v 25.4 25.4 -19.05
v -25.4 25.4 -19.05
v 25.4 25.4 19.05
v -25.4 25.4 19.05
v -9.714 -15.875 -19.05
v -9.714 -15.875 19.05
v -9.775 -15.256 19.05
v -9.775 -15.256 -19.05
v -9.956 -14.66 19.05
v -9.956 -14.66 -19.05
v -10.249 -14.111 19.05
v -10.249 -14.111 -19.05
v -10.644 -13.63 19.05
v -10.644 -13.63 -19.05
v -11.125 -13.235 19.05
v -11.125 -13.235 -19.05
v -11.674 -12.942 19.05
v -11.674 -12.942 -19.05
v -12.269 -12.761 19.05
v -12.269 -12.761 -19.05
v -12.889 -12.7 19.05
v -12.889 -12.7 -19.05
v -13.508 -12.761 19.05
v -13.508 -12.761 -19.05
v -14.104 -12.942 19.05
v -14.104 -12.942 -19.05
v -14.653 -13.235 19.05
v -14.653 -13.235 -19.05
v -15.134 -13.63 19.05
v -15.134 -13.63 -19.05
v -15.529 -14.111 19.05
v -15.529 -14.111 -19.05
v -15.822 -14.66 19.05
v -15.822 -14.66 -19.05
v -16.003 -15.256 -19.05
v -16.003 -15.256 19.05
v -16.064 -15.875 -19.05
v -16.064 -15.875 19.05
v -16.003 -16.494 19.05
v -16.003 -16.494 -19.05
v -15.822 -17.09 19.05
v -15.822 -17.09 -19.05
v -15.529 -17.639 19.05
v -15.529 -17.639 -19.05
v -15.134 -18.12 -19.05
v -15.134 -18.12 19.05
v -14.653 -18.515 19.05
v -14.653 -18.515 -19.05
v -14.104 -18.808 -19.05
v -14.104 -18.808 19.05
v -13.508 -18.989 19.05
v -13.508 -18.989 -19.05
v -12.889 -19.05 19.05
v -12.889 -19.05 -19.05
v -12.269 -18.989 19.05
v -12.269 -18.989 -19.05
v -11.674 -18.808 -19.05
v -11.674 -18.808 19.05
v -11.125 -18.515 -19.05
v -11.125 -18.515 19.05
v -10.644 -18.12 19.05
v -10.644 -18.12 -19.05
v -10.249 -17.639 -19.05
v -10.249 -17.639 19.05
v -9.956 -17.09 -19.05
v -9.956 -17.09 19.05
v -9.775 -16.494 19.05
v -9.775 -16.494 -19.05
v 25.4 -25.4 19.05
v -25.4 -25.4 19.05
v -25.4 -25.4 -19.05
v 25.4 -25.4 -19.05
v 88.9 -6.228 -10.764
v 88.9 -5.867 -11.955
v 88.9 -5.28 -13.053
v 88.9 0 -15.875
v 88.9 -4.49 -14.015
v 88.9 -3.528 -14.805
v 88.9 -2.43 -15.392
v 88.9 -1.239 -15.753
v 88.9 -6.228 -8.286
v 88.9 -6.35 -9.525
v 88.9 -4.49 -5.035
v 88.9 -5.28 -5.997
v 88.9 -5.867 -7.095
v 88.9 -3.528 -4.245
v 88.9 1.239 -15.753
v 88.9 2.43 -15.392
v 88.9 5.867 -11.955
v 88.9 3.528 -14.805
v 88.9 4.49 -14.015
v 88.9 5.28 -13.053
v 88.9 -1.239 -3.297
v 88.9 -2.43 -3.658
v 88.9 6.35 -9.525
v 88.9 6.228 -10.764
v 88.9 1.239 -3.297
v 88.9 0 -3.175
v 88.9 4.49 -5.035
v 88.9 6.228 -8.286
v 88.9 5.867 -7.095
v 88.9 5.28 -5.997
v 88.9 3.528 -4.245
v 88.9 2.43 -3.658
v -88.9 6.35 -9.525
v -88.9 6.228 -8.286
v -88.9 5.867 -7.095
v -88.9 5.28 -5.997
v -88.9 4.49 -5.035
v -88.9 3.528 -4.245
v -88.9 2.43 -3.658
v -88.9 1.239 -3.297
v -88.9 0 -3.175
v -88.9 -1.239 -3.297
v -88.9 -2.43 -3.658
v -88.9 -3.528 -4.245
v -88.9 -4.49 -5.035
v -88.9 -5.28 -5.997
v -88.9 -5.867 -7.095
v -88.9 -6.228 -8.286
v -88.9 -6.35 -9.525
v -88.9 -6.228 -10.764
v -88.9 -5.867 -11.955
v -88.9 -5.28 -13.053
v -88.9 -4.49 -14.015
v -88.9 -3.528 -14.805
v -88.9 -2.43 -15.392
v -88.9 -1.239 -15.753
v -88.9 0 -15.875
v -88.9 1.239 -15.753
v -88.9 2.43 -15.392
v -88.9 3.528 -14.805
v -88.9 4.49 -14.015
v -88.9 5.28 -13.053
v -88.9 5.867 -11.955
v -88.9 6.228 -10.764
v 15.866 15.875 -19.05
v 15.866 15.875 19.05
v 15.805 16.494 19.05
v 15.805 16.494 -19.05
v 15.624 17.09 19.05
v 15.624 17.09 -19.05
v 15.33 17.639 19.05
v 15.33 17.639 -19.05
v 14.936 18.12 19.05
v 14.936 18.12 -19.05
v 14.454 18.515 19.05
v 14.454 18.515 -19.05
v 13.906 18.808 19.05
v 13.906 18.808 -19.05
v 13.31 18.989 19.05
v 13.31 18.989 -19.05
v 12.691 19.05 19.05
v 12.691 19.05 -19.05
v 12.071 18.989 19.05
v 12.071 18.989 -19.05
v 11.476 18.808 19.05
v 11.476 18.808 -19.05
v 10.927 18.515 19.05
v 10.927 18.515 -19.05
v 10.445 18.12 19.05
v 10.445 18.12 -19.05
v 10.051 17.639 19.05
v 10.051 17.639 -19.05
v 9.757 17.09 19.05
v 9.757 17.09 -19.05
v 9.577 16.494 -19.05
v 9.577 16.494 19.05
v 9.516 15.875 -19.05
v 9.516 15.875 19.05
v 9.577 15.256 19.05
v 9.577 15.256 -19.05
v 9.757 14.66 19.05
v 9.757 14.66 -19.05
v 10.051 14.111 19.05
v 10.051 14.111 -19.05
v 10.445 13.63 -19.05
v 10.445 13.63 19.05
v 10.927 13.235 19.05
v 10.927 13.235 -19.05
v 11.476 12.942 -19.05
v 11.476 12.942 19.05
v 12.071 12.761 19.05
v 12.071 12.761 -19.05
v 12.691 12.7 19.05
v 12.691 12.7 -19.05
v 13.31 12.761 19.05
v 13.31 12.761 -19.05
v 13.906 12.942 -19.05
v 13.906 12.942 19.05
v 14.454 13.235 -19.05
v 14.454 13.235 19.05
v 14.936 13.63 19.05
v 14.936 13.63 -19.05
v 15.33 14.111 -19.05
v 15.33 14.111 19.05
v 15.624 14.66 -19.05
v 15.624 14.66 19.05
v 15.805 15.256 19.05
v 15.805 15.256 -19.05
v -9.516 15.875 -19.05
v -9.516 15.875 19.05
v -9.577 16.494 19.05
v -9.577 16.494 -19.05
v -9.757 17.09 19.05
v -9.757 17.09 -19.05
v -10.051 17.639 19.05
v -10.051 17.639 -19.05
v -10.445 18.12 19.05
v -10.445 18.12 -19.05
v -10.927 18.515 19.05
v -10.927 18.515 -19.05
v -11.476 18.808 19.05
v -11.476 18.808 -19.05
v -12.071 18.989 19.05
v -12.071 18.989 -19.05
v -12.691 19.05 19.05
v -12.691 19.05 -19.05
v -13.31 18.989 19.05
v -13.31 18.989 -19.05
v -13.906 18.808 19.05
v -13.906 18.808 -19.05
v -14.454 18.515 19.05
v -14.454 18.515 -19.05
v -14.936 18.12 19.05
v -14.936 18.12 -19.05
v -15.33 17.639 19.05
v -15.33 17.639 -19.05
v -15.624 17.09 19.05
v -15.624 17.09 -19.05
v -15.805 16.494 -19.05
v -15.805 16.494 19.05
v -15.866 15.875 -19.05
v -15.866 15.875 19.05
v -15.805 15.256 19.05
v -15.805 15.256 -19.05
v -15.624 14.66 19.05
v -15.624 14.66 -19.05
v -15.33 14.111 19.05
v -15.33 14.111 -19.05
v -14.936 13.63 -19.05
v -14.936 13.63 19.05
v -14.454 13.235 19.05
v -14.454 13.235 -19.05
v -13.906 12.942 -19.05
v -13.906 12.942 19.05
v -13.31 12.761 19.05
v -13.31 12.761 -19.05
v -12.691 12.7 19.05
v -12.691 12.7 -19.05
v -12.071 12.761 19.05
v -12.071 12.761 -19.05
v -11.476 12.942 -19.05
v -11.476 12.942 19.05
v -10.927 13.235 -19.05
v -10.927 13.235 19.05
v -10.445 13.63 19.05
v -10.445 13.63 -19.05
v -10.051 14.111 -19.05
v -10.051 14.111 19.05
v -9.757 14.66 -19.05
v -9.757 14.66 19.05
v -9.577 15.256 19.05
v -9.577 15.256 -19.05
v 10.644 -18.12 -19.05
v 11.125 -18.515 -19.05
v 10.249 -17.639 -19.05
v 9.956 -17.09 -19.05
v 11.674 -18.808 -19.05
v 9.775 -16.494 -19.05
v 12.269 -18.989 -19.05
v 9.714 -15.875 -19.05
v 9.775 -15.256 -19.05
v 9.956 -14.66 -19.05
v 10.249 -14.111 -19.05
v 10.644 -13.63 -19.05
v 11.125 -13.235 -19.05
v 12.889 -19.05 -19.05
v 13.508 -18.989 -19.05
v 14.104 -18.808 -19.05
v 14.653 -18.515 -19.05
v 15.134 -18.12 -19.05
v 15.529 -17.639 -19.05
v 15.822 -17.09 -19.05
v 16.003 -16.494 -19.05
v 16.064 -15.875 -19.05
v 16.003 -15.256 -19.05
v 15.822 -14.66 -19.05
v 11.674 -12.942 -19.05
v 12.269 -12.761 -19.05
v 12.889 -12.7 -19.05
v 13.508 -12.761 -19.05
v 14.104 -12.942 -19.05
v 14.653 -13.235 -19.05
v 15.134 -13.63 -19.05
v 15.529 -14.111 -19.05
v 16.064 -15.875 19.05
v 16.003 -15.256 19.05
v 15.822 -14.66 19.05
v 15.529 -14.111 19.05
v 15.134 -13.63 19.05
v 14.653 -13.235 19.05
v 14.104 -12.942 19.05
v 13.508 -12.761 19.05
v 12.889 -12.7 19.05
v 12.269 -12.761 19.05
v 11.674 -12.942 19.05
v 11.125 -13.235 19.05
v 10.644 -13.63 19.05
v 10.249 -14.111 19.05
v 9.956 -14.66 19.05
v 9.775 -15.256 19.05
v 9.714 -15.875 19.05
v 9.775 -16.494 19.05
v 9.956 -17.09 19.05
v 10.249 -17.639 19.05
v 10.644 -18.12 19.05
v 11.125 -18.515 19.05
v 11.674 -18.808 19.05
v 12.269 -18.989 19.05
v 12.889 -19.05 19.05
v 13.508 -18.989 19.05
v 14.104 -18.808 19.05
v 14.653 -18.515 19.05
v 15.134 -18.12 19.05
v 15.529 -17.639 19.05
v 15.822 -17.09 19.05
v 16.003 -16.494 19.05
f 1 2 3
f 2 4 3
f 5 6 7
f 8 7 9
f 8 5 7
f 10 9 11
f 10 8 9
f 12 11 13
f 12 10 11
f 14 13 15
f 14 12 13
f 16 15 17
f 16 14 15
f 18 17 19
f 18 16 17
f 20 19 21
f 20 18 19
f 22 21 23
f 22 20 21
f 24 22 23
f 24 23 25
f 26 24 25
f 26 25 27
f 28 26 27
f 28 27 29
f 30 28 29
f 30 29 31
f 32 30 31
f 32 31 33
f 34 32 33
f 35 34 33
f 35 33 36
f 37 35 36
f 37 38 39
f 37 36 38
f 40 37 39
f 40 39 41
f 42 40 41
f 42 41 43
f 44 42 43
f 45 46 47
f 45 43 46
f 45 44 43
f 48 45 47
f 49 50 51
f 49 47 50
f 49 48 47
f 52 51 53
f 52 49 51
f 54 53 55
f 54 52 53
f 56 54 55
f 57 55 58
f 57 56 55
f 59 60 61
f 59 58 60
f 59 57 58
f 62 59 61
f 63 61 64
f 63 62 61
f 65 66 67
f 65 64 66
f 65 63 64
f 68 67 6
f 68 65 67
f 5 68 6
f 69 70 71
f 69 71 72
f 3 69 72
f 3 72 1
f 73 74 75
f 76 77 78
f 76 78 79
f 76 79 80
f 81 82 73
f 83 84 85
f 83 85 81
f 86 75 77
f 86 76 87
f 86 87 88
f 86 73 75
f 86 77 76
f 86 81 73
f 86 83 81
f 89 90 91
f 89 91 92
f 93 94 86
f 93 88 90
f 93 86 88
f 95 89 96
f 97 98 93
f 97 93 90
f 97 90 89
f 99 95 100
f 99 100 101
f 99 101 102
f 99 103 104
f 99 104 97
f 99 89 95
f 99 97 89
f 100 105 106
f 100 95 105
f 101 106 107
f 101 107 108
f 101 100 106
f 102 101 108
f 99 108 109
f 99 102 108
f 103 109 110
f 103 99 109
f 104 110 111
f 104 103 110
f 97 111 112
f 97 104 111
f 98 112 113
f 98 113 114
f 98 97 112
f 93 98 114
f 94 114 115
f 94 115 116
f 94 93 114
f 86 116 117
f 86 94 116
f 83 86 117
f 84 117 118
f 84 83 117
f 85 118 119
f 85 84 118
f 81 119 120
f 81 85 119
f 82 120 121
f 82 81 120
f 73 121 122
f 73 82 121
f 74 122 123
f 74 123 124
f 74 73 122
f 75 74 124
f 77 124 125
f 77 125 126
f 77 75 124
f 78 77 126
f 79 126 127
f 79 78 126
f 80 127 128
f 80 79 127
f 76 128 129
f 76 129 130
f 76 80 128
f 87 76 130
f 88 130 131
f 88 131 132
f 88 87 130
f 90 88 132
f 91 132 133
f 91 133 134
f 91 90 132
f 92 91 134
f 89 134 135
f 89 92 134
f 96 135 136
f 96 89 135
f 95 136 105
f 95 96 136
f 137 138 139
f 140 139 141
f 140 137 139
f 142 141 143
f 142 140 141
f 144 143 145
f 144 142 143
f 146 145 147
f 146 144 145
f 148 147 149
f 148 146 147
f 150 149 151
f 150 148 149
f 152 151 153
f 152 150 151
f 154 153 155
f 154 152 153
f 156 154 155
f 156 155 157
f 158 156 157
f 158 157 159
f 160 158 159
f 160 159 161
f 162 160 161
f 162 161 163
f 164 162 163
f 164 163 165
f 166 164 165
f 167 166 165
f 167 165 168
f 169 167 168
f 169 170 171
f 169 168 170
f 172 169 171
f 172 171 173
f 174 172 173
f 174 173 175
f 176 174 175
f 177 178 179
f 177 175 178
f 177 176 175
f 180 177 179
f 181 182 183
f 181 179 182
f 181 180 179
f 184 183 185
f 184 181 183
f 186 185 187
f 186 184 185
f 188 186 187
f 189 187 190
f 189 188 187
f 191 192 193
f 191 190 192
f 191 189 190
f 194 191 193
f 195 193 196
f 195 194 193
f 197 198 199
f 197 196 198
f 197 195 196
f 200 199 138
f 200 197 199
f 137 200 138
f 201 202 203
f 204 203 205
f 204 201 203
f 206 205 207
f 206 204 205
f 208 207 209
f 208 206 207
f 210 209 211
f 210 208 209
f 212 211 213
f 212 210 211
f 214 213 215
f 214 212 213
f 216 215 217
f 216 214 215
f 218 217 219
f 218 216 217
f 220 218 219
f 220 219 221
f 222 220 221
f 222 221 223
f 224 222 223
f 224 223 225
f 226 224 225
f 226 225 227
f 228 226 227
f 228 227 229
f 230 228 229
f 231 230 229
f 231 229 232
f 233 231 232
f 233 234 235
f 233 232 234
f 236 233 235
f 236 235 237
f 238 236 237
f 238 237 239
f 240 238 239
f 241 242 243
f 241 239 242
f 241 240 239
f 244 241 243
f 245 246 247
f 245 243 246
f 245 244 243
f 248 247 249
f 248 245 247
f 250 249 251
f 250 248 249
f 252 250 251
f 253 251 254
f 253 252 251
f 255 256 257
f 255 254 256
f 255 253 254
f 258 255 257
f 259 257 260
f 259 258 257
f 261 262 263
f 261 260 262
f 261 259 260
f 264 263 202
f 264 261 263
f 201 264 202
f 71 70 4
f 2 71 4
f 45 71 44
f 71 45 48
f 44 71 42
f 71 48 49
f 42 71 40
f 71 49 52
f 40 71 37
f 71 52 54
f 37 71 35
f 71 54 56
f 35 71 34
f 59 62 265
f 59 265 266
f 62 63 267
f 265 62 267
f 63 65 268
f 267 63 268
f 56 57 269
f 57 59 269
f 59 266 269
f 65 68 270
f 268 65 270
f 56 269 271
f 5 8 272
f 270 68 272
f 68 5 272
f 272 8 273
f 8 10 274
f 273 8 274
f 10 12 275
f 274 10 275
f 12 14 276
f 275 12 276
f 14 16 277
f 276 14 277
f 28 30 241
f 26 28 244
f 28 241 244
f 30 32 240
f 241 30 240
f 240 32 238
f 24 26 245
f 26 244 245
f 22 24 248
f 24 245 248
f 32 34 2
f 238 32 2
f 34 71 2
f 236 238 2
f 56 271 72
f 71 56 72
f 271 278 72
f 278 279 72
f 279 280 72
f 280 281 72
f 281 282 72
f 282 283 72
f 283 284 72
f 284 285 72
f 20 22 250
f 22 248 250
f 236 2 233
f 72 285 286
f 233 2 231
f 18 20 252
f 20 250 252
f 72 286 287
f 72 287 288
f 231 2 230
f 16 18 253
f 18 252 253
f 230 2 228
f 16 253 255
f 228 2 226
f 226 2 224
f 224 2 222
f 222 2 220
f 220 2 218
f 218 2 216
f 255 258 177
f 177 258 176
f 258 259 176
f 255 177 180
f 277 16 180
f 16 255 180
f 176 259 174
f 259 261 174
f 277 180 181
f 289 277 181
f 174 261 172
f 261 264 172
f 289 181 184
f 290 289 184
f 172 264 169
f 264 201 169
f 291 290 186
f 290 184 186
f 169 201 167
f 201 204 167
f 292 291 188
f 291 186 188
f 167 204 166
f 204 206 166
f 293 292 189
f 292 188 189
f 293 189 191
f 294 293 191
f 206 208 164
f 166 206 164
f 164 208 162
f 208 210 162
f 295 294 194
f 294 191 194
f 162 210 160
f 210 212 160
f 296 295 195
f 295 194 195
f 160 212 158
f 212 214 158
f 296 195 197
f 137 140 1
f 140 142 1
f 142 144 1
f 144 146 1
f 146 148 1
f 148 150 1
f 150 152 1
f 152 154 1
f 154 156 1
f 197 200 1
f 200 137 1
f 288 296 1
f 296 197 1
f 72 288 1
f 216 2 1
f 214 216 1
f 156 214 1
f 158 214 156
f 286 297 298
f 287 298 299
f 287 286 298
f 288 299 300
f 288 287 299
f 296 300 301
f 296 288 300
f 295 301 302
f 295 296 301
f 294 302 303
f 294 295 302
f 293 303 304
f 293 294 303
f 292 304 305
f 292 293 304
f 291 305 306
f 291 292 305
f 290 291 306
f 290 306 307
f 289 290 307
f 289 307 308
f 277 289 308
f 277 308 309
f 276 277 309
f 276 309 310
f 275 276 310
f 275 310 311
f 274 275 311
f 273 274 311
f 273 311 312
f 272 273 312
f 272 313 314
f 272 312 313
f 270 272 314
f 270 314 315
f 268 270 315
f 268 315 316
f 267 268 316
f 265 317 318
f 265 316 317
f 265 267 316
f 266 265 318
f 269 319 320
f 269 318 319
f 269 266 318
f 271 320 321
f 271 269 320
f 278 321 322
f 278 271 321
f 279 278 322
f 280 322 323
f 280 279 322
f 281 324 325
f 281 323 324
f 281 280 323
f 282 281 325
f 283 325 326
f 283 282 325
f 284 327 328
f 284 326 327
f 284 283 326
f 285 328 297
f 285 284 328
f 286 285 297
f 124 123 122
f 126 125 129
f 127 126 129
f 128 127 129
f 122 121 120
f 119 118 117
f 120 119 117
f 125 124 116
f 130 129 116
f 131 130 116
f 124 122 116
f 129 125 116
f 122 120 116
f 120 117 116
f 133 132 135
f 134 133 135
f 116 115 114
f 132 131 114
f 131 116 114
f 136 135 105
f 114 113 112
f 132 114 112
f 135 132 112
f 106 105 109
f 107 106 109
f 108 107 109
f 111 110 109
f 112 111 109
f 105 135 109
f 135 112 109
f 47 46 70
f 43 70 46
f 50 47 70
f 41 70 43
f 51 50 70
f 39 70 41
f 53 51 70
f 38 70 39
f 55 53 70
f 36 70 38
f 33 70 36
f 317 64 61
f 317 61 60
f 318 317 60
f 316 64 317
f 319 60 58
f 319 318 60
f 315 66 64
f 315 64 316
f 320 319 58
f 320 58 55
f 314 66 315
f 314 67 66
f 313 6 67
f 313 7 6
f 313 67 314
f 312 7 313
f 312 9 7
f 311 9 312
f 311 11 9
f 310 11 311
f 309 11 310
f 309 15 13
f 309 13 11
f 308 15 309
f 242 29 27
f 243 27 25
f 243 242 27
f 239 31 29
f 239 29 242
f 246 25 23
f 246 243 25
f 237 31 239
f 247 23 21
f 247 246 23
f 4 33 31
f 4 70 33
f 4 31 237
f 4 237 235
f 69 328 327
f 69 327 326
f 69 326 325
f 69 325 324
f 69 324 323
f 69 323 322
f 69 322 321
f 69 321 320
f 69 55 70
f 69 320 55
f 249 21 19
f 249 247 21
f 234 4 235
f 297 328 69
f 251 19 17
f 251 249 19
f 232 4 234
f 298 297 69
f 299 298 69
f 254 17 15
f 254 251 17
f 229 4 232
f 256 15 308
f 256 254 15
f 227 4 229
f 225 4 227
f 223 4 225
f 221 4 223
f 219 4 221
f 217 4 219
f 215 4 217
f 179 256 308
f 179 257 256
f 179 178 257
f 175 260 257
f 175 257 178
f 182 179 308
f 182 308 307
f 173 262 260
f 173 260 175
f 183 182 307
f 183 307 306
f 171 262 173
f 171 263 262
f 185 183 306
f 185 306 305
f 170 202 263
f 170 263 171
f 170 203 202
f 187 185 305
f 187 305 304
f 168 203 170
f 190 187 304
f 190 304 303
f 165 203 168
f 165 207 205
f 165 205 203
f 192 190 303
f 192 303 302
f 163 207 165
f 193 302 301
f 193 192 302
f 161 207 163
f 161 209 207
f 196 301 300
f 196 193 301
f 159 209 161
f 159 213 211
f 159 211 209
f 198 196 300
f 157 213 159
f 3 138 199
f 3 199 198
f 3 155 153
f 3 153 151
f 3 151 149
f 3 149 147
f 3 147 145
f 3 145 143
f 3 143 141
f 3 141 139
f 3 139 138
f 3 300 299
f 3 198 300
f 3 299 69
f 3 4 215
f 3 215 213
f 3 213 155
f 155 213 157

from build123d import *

# Parameters (mm, degrees)
F0_W     = 50.8
F0_H     = 50.8
F0_R     = 3.175
F1_DEPTH = 19.05
F3_R     = 6.35
F4_DEPTH = 88.9


with BuildPart() as f1:
    # F0 (on Top) → F1 (new body, symmetric)
    with BuildSketch(Plane.XY):
        Rectangle(F0_W, F0_H)
        with Locations((-12.888848, -15.875)):
            Circle(F0_R, mode=Mode.SUBTRACT)
        with Locations((12.888848, -15.875)):
            Circle(F0_R, mode=Mode.SUBTRACT)
        with Locations((-12.690556, 15.875)):
            Circle(F0_R, mode=Mode.SUBTRACT)
        with Locations((12.690556, 15.875)):
            Circle(F0_R, mode=Mode.SUBTRACT)
    extrude(amount=F1_DEPTH, both=True)

    # F2: F1 across plane


with BuildPart() as f1_1:
    add(f1.part)
    add(f1.part.mirror(Plane.YZ))


with BuildPart() as f4:
    # F3 (on Right) → F4 (new body, symmetric)
    with BuildSketch(Plane.YZ):
        with Locations((0, -9.525)):
            Circle(F3_R)
    extrude(amount=F4_DEPTH, both=True)


solid = Compound([f1_1.part, f4.part])
